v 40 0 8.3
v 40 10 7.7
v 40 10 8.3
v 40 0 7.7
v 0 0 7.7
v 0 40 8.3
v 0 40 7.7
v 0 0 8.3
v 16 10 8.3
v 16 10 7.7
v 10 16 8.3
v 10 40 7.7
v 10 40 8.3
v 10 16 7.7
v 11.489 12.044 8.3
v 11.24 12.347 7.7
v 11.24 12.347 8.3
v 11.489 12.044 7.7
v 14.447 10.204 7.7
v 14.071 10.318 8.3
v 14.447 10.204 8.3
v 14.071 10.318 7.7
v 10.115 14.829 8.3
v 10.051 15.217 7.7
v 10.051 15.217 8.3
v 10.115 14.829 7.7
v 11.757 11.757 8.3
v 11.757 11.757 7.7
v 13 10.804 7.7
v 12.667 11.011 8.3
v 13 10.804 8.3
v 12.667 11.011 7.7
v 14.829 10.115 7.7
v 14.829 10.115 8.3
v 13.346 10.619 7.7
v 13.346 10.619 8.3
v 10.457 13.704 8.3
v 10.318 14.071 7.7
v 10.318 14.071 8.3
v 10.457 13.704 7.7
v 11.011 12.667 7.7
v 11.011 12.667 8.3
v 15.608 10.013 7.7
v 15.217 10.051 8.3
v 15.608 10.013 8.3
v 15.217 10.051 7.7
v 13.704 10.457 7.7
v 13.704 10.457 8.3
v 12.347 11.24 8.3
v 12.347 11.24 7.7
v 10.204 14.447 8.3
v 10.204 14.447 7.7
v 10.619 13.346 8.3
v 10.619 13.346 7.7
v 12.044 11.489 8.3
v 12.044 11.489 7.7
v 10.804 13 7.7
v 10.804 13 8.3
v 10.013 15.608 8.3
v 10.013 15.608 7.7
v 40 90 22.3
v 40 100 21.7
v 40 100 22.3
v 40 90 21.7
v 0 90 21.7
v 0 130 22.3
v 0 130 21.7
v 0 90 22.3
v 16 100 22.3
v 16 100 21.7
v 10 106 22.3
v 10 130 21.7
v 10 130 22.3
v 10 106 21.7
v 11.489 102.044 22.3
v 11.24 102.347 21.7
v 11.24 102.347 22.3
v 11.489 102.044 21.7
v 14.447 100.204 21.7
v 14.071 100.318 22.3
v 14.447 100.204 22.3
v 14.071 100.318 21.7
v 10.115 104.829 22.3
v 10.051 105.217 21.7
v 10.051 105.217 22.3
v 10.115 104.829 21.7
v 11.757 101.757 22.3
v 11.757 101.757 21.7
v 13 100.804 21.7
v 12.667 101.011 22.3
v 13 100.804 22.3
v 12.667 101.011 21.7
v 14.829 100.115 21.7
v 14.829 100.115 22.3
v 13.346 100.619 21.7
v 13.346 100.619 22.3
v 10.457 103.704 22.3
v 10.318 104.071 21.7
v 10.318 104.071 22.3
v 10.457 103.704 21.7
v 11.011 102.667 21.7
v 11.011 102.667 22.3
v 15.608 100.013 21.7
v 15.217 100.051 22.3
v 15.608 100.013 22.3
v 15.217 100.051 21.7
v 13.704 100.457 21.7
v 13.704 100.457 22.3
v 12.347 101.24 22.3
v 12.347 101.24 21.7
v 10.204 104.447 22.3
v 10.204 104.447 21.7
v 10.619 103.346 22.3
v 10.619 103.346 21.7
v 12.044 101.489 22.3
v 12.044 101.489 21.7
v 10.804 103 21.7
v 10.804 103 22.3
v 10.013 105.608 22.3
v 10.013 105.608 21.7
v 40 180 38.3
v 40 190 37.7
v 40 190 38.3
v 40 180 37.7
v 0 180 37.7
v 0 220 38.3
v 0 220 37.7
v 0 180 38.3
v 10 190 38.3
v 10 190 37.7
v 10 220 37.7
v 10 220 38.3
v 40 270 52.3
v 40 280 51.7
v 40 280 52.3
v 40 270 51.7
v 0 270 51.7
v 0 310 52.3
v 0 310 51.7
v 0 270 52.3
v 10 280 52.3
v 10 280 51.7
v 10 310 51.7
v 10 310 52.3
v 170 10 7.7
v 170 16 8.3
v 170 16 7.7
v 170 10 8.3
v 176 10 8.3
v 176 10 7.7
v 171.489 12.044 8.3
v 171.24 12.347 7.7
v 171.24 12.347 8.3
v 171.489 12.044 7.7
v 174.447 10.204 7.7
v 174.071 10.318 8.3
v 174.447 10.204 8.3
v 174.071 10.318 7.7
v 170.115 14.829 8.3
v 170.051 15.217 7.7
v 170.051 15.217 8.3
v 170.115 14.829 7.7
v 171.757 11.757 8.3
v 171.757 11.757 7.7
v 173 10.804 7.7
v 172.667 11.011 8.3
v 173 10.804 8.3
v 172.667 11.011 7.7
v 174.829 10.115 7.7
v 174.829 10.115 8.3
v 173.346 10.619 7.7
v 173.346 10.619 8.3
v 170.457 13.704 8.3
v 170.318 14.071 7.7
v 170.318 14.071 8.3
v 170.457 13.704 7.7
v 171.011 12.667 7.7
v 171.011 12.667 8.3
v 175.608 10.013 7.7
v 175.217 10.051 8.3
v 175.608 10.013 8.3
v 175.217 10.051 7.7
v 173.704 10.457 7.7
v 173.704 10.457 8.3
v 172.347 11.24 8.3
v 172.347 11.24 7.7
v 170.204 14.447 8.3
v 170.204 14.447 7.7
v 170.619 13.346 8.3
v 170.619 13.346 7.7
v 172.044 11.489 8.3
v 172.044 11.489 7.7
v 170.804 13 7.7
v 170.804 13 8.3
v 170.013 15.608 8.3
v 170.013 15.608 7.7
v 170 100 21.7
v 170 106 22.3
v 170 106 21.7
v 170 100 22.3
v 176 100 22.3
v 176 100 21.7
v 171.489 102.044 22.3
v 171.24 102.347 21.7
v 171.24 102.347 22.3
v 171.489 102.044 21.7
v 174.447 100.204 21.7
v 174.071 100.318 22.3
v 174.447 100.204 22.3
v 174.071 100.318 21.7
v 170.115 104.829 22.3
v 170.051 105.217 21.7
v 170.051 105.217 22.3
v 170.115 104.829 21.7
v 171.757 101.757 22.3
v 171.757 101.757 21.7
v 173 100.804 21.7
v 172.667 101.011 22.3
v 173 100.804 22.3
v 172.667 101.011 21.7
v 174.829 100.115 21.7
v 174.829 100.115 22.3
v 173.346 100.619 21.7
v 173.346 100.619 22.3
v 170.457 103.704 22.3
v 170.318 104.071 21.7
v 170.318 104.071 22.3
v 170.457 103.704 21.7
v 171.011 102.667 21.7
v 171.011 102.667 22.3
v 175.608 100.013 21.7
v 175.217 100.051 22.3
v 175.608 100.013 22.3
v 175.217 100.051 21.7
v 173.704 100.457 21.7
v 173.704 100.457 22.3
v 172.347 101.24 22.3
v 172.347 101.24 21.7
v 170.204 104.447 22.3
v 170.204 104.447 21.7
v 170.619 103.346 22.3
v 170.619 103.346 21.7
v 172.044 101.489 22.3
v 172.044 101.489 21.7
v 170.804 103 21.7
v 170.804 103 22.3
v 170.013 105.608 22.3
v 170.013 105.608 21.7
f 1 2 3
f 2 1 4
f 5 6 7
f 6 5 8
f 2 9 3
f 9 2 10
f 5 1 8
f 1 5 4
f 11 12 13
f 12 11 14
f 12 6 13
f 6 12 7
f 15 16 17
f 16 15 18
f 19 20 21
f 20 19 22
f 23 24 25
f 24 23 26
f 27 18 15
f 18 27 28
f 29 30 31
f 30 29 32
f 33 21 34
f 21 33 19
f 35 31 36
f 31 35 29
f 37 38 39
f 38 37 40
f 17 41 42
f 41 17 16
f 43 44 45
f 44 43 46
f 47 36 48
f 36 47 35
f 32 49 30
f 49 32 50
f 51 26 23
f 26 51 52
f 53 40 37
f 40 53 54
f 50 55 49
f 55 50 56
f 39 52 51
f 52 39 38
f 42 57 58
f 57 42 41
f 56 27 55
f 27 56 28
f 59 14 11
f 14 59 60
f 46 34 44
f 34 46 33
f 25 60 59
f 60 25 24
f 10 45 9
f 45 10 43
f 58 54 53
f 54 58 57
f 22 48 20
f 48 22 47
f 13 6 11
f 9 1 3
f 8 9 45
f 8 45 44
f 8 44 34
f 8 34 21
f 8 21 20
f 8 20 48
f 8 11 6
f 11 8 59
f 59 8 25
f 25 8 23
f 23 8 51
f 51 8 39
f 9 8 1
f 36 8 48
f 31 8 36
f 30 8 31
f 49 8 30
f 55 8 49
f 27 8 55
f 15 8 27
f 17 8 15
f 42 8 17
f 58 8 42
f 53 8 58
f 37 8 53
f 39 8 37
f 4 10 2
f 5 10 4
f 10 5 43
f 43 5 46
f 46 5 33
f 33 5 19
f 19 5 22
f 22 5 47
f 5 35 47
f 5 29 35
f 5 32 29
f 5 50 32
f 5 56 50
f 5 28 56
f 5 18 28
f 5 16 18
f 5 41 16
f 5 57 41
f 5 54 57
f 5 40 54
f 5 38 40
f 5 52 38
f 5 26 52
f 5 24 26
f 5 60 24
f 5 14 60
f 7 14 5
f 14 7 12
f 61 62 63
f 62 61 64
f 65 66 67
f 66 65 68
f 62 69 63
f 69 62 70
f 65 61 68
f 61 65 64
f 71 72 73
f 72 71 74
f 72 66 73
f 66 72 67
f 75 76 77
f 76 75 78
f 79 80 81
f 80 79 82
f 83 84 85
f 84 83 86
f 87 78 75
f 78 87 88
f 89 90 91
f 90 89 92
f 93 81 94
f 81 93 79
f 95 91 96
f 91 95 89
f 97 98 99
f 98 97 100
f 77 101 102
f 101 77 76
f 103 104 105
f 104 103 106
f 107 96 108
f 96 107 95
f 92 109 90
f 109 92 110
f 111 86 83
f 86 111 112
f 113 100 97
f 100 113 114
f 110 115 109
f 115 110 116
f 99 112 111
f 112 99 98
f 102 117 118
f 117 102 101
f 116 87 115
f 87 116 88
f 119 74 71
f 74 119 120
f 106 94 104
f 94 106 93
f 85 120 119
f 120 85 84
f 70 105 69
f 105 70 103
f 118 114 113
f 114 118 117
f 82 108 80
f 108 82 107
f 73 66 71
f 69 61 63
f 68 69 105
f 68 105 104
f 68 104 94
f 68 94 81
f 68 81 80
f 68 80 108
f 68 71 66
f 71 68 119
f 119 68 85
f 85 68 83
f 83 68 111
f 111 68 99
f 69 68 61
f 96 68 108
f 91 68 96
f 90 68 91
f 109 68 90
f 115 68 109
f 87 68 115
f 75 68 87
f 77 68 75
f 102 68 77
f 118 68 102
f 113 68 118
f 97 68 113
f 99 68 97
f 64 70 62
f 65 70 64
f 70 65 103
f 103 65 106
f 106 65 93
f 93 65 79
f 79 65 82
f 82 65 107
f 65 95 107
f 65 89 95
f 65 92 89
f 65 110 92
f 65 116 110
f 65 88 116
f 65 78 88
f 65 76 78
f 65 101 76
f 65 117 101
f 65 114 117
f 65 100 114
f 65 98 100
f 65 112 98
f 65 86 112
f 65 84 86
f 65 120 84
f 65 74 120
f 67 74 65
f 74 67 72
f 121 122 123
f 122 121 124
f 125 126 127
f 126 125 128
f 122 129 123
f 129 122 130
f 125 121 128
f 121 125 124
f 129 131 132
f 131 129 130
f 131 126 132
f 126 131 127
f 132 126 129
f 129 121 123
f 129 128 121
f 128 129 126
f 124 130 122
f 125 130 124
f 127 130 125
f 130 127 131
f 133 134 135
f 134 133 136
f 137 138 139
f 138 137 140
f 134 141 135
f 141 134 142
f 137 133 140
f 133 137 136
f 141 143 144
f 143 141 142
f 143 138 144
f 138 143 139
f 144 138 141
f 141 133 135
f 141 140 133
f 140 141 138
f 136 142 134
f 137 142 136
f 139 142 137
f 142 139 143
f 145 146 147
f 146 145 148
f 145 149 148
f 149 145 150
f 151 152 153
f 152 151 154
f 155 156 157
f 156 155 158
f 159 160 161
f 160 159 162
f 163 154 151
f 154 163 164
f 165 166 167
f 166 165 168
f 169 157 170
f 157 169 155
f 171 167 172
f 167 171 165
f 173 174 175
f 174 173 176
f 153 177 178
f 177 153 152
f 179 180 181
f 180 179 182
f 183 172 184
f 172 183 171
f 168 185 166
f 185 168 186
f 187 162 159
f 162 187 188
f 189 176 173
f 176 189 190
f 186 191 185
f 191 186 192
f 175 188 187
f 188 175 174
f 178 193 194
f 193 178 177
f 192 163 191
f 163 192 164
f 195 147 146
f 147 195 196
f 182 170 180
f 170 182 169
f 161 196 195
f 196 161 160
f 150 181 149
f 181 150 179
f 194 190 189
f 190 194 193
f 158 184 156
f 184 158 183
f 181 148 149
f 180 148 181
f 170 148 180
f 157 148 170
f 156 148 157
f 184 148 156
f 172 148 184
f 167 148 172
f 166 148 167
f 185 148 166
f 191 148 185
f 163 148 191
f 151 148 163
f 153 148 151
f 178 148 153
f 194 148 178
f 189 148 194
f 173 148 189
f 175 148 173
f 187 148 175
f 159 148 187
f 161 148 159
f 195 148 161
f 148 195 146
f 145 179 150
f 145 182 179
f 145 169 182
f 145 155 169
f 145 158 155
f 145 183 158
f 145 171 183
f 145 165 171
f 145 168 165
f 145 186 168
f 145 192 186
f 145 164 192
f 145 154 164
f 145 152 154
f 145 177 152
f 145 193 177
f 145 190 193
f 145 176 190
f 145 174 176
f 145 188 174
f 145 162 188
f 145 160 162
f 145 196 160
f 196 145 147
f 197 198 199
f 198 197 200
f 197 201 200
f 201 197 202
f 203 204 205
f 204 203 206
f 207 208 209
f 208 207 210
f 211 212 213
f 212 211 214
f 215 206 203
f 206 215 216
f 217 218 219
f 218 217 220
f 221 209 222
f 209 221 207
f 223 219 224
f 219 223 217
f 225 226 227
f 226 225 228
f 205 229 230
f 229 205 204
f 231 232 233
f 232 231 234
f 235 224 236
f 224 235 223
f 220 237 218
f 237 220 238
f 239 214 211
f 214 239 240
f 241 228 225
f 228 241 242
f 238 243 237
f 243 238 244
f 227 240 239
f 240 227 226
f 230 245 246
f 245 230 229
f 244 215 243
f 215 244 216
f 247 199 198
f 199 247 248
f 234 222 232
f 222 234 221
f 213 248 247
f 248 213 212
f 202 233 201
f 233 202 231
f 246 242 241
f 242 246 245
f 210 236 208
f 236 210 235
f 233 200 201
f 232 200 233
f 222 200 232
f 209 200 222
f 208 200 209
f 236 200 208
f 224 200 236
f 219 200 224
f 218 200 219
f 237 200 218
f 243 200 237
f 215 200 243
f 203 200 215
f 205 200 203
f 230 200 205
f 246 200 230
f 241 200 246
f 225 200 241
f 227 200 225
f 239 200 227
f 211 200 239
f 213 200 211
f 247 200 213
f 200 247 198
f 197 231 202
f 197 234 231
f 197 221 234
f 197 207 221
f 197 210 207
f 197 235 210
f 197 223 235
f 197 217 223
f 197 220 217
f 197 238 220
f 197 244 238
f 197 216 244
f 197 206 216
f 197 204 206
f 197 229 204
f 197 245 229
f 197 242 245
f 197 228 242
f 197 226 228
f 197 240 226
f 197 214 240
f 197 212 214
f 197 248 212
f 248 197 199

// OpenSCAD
// file: _fillet_ref.scad
// -----------------------------------------------------------------------------
// M1 visual harness — shared reference tools + cross-cut viewer
//
// These are HAND-WRITTEN reference fillet/round/chamfer tools built from the
// classic OpenSCAD idioms (annulus - torus, wedge - cylinder, ...). They do NOT
// depend on the fillet_tool/round_tool nodes, so they render today and give the
// known-good target that later milestones (M5, M7) must reproduce.
//
// Convention for every case: geometry is built so the feature EDGE runs along Z,
// and we take a thin-slab horizontal cross-section (normal +Z). One image then
// shows, side by side along X:
//     [ base model ] [ applied result ] [ isolated tool solid ]
// and, stacked along Y, a small radius and a large radius (>= surface extent).
// -----------------------------------------------------------------------------

// Thin-slab section: intersect children with a thin horizontal slab at height z.
// XY size is deliberately huge so it covers the whole laid-out scene; only z and
// thickness matter for what the section shows.
module fillet_section(z = 0, thickness = 0.6, extent = 4000) {
  intersection() {
    children();
    translate([0, 0, z]) cube([extent, extent, thickness], center = true);
  }
}

// Vertical thin-slab section (normal +Y), for axis-symmetric ring features where
// a cut through the axis shows the rho-z profile and the ring fillet on both sides.
module fillet_vsection(y = 0, thickness = 0.6, extent = 4000) {
  intersection() {
    children();
    translate([0, y, 0]) cube([extent, thickness, extent], center = true);
  }
}

// Stack several thin-slab sections at different heights, translated apart along
// +Y so the section EVOLVING toward a junction is visible at a glance (used for
// the 3-/4-face meeting-point cases).
module fillet_contour_stack(zs, thickness = 0.6, spacing = 90, extent = 4000) {
  for (i = [0 : len(zs) - 1])
    translate([0, i * spacing, 0])
      fillet_section(z = zs[i], thickness = thickness, extent = extent)
        children();
}

// ---- reference tools for a single 90-degree edge running along Z -------------

// Inner (concave) fillet bead. Faces are x = cx (material x < cx) and y = cy
// (material y < cy); the reentrant quadrant opens toward +x,+y. Union this with
// the model. Cross-section = corner square minus a quarter disc (= a fillet).
module ref_fillet_edge_z(cx, cy, r, h, z0 = 0) {
  translate([0, 0, z0])
    difference() {
      translate([cx, cy, 0]) cube([r, r, h]);
      translate([cx + r, cy + r, -1]) cylinder(r = r, h = h + 2);
    }
}

// Outer (convex) round tool. Convex corner at (cx,cy), material x < cx & y < cy.
// SUBTRACT this from the model; it is the sharp corner sliver outside the arc.
module ref_round_edge_z(cx, cy, r, h, z0 = 0) {
  translate([0, 0, z0])
    difference() {
      translate([cx - r, cy - r, 0]) cube([r, r, h]);
      translate([cx - r, cy - r, -1]) cylinder(r = r, h = h + 2);
    }
}

// Inner (concave) chamfer bead — the wedge alone, no arc. Union with the model.
module ref_chamfer_edge_z(cx, cy, t, h, z0 = 0) {
  translate([0, 0, z0])
    linear_extrude(h)
      polygon([[cx, cy], [cx + t, cy], [cx, cy + t]]);
}
// main file
// Case F — brush selecting only PART of an edge. Same inner-corner L as case A,
// edge along Z, but the fillet exists only for z in [0, brush_top]. The hand
// reference clips the bead (W) with a box brush, which gives the correct FLAT
// perpendicular cap (plan §7.2 — clip W, not U; no scooped round end).
//
// Contour stack at rising z: the upper sections (inside the brush) show the arc;
// the lower sections (past brush_top) are sharp again. The isolated-tool column
// shows the flat cap directly.

include <_fillet_ref.scad>;

$fn = 96;

H  = 60;
CX = 10;
CY = 10;
r  = 6;
brush_top = 30;     // fillet only where z < 30

module Lmodel() {
  cube([40, CY, H]);
  cube([CX, 40, H]);
}

module clipped_tool() {
  intersection() {
    ref_fillet_edge_z(CX, CY, r, H);
    translate([-10, -10, 0]) cube([200, 200, brush_top]);   // box brush: z < 30
  }
}

zs = [8, 22, 38, 52];   // two inside the brush, two past its cap

// applied (model + partial fillet)
fillet_contour_stack(zs) { Lmodel(); clipped_tool(); }

// isolated clipped tool — shows the flat perpendicular cap
translate([160, 0, 0]) fillet_contour_stack(zs) clipped_tool();
